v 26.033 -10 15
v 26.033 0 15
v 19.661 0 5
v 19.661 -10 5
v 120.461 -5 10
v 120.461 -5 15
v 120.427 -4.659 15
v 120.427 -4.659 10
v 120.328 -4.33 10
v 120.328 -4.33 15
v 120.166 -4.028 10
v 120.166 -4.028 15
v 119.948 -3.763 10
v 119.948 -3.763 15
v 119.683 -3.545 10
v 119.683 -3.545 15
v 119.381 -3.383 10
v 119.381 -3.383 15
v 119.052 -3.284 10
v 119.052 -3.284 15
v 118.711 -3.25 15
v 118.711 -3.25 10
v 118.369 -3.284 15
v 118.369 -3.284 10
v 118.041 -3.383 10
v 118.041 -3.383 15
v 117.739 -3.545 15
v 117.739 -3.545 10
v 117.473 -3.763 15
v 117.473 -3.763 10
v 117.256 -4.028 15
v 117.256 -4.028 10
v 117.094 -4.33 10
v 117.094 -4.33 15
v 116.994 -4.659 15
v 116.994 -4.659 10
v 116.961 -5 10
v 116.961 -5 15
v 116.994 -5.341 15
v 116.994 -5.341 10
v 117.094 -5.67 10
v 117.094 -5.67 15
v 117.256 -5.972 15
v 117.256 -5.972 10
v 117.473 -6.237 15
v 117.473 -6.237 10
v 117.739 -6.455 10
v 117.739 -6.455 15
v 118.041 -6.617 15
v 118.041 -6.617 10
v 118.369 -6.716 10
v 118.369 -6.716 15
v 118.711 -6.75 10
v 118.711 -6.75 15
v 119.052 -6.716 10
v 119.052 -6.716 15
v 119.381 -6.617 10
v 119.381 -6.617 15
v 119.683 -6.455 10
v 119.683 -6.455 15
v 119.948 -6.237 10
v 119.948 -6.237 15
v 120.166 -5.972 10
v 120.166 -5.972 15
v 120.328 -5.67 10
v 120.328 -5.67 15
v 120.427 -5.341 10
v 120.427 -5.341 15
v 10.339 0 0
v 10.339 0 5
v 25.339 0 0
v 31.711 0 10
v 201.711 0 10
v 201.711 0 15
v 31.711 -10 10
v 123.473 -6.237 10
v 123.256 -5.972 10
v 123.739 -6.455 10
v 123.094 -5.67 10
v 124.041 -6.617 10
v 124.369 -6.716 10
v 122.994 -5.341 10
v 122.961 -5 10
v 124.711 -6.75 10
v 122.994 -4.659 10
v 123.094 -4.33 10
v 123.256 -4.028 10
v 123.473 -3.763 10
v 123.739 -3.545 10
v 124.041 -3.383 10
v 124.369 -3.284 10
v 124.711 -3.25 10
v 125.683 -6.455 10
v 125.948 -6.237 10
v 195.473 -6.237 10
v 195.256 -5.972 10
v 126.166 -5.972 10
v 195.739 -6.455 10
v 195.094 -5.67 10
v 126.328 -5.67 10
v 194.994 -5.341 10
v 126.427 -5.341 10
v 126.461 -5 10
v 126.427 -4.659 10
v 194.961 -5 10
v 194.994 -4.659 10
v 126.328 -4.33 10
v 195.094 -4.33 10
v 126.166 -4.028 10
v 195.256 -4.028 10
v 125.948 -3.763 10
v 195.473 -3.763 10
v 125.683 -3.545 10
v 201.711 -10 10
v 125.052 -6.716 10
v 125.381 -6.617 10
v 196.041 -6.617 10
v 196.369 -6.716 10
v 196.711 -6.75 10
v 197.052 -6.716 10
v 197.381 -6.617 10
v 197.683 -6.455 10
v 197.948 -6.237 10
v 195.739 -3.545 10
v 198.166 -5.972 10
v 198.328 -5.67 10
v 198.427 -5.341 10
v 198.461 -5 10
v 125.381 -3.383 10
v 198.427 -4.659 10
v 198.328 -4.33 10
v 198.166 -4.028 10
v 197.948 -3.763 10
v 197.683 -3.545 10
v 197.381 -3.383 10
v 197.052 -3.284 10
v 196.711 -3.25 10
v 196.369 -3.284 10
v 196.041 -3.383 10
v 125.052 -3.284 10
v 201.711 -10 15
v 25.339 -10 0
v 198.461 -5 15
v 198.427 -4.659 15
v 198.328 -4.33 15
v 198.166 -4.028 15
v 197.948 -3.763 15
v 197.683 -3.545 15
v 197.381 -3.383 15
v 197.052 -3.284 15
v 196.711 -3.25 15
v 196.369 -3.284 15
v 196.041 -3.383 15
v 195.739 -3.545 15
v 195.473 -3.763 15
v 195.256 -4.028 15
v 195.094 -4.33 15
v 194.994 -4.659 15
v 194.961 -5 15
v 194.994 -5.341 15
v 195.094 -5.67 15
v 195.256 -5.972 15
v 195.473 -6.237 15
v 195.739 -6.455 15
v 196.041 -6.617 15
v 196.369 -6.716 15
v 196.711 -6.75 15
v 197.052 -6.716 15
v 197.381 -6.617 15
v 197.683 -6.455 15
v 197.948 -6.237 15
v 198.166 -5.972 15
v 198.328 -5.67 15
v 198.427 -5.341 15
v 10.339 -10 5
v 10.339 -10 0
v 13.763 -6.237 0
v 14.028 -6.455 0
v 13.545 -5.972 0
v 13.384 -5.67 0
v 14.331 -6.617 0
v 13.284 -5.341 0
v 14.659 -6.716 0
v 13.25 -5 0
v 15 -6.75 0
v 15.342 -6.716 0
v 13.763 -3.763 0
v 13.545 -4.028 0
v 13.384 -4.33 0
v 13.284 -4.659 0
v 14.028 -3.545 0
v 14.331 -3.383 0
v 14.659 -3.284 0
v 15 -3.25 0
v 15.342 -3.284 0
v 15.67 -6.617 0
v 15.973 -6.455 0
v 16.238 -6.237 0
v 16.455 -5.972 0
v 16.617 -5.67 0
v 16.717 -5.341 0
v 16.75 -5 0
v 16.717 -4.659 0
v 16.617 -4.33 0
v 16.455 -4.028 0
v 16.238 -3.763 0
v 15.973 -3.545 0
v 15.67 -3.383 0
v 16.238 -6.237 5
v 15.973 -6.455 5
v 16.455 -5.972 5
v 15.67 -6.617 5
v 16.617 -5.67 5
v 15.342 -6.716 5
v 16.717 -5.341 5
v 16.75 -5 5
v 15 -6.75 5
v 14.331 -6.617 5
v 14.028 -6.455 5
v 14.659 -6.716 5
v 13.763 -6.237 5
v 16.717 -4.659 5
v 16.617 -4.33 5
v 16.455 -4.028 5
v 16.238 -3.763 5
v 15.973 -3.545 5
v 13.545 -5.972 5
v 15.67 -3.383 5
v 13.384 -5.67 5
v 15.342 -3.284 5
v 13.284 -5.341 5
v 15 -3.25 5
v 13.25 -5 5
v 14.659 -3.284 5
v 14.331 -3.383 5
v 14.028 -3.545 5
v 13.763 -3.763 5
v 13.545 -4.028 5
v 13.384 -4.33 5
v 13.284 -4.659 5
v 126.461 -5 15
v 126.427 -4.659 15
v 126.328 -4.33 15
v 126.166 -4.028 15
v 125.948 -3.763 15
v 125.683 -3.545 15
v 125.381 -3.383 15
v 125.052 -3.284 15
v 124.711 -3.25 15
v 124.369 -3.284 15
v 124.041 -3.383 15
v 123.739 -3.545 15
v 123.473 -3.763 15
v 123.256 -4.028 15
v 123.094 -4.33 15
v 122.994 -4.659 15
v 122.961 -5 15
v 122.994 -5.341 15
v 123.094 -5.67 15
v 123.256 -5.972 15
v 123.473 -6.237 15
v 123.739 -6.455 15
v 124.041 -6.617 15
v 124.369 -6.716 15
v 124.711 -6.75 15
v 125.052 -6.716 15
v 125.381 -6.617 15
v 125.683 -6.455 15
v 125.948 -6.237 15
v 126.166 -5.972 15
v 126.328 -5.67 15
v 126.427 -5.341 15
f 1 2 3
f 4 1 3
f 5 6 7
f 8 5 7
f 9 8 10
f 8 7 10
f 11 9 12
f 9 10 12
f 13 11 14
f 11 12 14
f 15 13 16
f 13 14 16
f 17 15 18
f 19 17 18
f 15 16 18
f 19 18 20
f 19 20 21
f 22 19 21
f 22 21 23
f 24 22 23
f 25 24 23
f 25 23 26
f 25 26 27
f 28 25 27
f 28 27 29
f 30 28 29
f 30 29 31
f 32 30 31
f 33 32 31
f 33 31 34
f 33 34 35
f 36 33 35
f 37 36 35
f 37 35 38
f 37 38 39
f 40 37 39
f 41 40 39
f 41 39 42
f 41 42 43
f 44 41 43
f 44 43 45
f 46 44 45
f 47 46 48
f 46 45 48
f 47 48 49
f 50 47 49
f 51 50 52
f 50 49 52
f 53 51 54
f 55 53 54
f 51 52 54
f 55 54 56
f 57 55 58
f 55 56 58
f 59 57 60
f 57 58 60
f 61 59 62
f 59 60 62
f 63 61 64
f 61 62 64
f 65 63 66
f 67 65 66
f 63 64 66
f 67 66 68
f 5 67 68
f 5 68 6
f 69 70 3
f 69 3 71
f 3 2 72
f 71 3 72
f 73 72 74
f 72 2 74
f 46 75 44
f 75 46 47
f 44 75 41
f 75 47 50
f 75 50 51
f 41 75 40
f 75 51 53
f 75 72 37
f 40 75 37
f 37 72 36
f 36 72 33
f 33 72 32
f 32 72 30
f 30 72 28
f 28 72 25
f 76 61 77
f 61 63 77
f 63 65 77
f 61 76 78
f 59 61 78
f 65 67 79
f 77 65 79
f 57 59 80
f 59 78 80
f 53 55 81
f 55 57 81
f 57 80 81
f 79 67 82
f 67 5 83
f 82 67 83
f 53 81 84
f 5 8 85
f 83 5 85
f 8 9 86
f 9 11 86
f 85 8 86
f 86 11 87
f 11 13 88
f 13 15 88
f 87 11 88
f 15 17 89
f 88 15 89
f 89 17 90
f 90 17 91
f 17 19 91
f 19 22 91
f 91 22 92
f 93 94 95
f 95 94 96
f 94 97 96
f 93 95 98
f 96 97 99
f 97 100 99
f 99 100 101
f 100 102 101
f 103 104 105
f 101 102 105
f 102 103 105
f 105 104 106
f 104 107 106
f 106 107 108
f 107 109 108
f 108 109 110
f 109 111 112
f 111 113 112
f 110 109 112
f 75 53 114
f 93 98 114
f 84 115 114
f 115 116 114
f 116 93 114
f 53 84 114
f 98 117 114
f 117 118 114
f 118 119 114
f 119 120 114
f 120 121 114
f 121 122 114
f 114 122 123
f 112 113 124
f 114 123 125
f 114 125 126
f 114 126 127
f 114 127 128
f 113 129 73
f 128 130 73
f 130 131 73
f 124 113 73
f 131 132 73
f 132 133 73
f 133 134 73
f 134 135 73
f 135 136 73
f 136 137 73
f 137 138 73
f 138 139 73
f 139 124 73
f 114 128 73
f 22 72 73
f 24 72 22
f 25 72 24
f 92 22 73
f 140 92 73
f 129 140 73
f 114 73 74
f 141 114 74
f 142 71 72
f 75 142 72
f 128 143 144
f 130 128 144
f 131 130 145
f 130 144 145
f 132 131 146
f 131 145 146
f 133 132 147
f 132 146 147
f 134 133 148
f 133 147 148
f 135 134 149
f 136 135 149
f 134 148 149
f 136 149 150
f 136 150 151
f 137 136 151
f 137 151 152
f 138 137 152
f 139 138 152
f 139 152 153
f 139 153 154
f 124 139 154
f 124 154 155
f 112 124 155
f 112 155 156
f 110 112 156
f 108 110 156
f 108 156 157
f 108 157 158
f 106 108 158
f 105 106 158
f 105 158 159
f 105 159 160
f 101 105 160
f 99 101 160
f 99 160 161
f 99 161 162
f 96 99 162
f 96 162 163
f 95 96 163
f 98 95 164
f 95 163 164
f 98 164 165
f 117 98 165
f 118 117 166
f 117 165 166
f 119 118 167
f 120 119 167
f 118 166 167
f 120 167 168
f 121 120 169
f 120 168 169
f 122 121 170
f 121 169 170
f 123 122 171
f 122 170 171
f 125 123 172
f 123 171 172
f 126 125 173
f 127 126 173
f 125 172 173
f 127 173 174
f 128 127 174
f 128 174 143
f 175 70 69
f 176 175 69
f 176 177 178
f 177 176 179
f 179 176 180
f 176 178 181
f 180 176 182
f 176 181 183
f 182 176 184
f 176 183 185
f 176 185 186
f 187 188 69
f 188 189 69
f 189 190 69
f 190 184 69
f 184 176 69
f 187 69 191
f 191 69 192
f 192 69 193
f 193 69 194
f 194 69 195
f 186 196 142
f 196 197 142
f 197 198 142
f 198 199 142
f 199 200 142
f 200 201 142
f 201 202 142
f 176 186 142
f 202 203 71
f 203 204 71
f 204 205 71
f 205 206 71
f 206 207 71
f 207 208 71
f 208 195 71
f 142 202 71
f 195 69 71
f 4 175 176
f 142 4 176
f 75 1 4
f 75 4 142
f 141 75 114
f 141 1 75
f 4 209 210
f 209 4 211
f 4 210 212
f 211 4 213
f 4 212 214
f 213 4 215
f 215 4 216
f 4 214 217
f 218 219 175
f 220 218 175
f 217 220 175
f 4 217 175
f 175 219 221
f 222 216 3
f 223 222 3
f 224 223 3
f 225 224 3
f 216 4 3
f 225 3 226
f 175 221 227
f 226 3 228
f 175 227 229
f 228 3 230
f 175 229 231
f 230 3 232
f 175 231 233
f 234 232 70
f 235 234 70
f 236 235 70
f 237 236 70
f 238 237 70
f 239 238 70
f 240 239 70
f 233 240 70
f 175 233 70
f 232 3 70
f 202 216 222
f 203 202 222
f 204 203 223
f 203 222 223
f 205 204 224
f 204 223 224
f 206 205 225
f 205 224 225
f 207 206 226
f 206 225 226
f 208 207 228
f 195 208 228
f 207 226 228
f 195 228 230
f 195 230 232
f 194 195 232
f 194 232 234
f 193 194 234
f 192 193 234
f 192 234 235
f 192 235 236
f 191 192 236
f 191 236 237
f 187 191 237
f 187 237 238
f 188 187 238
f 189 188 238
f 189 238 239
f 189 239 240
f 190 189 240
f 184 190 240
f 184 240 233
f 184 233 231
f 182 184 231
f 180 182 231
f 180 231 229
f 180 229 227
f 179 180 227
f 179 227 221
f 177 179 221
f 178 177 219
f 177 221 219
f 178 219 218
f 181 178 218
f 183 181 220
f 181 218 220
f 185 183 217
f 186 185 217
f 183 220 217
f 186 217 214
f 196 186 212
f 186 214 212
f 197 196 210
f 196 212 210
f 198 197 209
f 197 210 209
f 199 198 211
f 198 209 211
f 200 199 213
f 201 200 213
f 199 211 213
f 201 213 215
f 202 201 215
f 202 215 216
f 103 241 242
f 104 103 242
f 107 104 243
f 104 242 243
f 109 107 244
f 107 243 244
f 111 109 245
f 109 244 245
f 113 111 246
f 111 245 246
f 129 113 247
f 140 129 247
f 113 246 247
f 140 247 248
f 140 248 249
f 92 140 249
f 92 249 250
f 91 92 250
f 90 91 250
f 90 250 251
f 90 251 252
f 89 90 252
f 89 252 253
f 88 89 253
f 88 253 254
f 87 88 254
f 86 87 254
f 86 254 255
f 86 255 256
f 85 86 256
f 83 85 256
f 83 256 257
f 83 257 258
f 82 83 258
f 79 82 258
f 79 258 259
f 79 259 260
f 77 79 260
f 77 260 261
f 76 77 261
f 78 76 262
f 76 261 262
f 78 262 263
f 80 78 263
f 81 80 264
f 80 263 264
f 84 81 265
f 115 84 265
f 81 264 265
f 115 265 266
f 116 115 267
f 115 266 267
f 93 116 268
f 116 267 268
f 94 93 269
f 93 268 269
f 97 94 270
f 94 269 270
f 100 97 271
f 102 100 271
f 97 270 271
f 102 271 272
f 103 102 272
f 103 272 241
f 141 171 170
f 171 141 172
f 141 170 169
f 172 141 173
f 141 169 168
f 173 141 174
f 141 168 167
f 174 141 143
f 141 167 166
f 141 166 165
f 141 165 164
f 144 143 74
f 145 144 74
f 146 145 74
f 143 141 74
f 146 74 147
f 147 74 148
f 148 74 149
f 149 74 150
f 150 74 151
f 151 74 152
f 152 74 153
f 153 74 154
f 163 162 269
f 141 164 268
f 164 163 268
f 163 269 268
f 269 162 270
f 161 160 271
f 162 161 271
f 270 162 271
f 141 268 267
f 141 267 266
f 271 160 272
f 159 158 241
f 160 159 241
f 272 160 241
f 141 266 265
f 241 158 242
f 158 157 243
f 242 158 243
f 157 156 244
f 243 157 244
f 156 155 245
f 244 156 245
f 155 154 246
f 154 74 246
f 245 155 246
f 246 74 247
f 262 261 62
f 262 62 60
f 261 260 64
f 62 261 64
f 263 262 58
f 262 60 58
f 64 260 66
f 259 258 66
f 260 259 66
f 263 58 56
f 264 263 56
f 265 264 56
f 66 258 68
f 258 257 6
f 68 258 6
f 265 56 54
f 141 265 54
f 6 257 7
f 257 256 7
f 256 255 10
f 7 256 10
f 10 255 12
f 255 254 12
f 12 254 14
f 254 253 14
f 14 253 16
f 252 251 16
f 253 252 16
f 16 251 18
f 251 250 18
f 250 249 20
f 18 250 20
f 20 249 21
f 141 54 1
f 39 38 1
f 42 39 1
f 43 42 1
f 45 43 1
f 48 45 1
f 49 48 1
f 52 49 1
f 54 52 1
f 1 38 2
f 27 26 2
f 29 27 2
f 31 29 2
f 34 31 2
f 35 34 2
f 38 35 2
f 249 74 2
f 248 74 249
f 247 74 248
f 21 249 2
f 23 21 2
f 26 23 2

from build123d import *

# Parameters (mm, degrees)
F1_DEPTH = 10
F2_R     = 1.75
F3_DEPTH = 15.001
F5_DEPTH = 5.001


# Not quite as in the source:
# - a feature names something its author has since deleted; it is built from what else it names


with BuildPart() as f1:
    # F0 (on Front) → F1 (new body)
    with BuildSketch(Plane.XZ):
        Polygon((31.7108153552, 10), (201.7108153552, 10), (201.7108153552, 15), (30.3418431431, 15), (26.0328800881, 15), (19.6614095846, 5), (10.3393448517, 5), (10.3393448517, 0), (25.3393448517, 0), align=None)
    extrude(amount=F1_DEPTH)

    # F2 (on face) → F3 (cut, through all)
    with BuildSketch(Plane.XY.offset(15)):
        with Locations((118.7108153552, -5)):
            Circle(F2_R)
        with Locations((124.7108153552, -5)):
            Circle(F2_R)
        with Locations((196.7108153552, -5)):
            Circle(F2_R)
    extrude(amount=-F3_DEPTH, mode=Mode.SUBTRACT)

    # F4 (on face) → F5 (cut, through all)
    with BuildSketch(Plane.XY.offset(5)):
        with BuildLine():
            ThreePointArc((13.2503772181, -5), (15.0003772181, -6.75), (16.7503772181, -5))
            ThreePointArc((16.7503772181, -5), (15.0003772181, -3.25), (13.2503772181, -5))
        make_face()
    extrude(amount=-F5_DEPTH, mode=Mode.SUBTRACT)


solid = f1.part
